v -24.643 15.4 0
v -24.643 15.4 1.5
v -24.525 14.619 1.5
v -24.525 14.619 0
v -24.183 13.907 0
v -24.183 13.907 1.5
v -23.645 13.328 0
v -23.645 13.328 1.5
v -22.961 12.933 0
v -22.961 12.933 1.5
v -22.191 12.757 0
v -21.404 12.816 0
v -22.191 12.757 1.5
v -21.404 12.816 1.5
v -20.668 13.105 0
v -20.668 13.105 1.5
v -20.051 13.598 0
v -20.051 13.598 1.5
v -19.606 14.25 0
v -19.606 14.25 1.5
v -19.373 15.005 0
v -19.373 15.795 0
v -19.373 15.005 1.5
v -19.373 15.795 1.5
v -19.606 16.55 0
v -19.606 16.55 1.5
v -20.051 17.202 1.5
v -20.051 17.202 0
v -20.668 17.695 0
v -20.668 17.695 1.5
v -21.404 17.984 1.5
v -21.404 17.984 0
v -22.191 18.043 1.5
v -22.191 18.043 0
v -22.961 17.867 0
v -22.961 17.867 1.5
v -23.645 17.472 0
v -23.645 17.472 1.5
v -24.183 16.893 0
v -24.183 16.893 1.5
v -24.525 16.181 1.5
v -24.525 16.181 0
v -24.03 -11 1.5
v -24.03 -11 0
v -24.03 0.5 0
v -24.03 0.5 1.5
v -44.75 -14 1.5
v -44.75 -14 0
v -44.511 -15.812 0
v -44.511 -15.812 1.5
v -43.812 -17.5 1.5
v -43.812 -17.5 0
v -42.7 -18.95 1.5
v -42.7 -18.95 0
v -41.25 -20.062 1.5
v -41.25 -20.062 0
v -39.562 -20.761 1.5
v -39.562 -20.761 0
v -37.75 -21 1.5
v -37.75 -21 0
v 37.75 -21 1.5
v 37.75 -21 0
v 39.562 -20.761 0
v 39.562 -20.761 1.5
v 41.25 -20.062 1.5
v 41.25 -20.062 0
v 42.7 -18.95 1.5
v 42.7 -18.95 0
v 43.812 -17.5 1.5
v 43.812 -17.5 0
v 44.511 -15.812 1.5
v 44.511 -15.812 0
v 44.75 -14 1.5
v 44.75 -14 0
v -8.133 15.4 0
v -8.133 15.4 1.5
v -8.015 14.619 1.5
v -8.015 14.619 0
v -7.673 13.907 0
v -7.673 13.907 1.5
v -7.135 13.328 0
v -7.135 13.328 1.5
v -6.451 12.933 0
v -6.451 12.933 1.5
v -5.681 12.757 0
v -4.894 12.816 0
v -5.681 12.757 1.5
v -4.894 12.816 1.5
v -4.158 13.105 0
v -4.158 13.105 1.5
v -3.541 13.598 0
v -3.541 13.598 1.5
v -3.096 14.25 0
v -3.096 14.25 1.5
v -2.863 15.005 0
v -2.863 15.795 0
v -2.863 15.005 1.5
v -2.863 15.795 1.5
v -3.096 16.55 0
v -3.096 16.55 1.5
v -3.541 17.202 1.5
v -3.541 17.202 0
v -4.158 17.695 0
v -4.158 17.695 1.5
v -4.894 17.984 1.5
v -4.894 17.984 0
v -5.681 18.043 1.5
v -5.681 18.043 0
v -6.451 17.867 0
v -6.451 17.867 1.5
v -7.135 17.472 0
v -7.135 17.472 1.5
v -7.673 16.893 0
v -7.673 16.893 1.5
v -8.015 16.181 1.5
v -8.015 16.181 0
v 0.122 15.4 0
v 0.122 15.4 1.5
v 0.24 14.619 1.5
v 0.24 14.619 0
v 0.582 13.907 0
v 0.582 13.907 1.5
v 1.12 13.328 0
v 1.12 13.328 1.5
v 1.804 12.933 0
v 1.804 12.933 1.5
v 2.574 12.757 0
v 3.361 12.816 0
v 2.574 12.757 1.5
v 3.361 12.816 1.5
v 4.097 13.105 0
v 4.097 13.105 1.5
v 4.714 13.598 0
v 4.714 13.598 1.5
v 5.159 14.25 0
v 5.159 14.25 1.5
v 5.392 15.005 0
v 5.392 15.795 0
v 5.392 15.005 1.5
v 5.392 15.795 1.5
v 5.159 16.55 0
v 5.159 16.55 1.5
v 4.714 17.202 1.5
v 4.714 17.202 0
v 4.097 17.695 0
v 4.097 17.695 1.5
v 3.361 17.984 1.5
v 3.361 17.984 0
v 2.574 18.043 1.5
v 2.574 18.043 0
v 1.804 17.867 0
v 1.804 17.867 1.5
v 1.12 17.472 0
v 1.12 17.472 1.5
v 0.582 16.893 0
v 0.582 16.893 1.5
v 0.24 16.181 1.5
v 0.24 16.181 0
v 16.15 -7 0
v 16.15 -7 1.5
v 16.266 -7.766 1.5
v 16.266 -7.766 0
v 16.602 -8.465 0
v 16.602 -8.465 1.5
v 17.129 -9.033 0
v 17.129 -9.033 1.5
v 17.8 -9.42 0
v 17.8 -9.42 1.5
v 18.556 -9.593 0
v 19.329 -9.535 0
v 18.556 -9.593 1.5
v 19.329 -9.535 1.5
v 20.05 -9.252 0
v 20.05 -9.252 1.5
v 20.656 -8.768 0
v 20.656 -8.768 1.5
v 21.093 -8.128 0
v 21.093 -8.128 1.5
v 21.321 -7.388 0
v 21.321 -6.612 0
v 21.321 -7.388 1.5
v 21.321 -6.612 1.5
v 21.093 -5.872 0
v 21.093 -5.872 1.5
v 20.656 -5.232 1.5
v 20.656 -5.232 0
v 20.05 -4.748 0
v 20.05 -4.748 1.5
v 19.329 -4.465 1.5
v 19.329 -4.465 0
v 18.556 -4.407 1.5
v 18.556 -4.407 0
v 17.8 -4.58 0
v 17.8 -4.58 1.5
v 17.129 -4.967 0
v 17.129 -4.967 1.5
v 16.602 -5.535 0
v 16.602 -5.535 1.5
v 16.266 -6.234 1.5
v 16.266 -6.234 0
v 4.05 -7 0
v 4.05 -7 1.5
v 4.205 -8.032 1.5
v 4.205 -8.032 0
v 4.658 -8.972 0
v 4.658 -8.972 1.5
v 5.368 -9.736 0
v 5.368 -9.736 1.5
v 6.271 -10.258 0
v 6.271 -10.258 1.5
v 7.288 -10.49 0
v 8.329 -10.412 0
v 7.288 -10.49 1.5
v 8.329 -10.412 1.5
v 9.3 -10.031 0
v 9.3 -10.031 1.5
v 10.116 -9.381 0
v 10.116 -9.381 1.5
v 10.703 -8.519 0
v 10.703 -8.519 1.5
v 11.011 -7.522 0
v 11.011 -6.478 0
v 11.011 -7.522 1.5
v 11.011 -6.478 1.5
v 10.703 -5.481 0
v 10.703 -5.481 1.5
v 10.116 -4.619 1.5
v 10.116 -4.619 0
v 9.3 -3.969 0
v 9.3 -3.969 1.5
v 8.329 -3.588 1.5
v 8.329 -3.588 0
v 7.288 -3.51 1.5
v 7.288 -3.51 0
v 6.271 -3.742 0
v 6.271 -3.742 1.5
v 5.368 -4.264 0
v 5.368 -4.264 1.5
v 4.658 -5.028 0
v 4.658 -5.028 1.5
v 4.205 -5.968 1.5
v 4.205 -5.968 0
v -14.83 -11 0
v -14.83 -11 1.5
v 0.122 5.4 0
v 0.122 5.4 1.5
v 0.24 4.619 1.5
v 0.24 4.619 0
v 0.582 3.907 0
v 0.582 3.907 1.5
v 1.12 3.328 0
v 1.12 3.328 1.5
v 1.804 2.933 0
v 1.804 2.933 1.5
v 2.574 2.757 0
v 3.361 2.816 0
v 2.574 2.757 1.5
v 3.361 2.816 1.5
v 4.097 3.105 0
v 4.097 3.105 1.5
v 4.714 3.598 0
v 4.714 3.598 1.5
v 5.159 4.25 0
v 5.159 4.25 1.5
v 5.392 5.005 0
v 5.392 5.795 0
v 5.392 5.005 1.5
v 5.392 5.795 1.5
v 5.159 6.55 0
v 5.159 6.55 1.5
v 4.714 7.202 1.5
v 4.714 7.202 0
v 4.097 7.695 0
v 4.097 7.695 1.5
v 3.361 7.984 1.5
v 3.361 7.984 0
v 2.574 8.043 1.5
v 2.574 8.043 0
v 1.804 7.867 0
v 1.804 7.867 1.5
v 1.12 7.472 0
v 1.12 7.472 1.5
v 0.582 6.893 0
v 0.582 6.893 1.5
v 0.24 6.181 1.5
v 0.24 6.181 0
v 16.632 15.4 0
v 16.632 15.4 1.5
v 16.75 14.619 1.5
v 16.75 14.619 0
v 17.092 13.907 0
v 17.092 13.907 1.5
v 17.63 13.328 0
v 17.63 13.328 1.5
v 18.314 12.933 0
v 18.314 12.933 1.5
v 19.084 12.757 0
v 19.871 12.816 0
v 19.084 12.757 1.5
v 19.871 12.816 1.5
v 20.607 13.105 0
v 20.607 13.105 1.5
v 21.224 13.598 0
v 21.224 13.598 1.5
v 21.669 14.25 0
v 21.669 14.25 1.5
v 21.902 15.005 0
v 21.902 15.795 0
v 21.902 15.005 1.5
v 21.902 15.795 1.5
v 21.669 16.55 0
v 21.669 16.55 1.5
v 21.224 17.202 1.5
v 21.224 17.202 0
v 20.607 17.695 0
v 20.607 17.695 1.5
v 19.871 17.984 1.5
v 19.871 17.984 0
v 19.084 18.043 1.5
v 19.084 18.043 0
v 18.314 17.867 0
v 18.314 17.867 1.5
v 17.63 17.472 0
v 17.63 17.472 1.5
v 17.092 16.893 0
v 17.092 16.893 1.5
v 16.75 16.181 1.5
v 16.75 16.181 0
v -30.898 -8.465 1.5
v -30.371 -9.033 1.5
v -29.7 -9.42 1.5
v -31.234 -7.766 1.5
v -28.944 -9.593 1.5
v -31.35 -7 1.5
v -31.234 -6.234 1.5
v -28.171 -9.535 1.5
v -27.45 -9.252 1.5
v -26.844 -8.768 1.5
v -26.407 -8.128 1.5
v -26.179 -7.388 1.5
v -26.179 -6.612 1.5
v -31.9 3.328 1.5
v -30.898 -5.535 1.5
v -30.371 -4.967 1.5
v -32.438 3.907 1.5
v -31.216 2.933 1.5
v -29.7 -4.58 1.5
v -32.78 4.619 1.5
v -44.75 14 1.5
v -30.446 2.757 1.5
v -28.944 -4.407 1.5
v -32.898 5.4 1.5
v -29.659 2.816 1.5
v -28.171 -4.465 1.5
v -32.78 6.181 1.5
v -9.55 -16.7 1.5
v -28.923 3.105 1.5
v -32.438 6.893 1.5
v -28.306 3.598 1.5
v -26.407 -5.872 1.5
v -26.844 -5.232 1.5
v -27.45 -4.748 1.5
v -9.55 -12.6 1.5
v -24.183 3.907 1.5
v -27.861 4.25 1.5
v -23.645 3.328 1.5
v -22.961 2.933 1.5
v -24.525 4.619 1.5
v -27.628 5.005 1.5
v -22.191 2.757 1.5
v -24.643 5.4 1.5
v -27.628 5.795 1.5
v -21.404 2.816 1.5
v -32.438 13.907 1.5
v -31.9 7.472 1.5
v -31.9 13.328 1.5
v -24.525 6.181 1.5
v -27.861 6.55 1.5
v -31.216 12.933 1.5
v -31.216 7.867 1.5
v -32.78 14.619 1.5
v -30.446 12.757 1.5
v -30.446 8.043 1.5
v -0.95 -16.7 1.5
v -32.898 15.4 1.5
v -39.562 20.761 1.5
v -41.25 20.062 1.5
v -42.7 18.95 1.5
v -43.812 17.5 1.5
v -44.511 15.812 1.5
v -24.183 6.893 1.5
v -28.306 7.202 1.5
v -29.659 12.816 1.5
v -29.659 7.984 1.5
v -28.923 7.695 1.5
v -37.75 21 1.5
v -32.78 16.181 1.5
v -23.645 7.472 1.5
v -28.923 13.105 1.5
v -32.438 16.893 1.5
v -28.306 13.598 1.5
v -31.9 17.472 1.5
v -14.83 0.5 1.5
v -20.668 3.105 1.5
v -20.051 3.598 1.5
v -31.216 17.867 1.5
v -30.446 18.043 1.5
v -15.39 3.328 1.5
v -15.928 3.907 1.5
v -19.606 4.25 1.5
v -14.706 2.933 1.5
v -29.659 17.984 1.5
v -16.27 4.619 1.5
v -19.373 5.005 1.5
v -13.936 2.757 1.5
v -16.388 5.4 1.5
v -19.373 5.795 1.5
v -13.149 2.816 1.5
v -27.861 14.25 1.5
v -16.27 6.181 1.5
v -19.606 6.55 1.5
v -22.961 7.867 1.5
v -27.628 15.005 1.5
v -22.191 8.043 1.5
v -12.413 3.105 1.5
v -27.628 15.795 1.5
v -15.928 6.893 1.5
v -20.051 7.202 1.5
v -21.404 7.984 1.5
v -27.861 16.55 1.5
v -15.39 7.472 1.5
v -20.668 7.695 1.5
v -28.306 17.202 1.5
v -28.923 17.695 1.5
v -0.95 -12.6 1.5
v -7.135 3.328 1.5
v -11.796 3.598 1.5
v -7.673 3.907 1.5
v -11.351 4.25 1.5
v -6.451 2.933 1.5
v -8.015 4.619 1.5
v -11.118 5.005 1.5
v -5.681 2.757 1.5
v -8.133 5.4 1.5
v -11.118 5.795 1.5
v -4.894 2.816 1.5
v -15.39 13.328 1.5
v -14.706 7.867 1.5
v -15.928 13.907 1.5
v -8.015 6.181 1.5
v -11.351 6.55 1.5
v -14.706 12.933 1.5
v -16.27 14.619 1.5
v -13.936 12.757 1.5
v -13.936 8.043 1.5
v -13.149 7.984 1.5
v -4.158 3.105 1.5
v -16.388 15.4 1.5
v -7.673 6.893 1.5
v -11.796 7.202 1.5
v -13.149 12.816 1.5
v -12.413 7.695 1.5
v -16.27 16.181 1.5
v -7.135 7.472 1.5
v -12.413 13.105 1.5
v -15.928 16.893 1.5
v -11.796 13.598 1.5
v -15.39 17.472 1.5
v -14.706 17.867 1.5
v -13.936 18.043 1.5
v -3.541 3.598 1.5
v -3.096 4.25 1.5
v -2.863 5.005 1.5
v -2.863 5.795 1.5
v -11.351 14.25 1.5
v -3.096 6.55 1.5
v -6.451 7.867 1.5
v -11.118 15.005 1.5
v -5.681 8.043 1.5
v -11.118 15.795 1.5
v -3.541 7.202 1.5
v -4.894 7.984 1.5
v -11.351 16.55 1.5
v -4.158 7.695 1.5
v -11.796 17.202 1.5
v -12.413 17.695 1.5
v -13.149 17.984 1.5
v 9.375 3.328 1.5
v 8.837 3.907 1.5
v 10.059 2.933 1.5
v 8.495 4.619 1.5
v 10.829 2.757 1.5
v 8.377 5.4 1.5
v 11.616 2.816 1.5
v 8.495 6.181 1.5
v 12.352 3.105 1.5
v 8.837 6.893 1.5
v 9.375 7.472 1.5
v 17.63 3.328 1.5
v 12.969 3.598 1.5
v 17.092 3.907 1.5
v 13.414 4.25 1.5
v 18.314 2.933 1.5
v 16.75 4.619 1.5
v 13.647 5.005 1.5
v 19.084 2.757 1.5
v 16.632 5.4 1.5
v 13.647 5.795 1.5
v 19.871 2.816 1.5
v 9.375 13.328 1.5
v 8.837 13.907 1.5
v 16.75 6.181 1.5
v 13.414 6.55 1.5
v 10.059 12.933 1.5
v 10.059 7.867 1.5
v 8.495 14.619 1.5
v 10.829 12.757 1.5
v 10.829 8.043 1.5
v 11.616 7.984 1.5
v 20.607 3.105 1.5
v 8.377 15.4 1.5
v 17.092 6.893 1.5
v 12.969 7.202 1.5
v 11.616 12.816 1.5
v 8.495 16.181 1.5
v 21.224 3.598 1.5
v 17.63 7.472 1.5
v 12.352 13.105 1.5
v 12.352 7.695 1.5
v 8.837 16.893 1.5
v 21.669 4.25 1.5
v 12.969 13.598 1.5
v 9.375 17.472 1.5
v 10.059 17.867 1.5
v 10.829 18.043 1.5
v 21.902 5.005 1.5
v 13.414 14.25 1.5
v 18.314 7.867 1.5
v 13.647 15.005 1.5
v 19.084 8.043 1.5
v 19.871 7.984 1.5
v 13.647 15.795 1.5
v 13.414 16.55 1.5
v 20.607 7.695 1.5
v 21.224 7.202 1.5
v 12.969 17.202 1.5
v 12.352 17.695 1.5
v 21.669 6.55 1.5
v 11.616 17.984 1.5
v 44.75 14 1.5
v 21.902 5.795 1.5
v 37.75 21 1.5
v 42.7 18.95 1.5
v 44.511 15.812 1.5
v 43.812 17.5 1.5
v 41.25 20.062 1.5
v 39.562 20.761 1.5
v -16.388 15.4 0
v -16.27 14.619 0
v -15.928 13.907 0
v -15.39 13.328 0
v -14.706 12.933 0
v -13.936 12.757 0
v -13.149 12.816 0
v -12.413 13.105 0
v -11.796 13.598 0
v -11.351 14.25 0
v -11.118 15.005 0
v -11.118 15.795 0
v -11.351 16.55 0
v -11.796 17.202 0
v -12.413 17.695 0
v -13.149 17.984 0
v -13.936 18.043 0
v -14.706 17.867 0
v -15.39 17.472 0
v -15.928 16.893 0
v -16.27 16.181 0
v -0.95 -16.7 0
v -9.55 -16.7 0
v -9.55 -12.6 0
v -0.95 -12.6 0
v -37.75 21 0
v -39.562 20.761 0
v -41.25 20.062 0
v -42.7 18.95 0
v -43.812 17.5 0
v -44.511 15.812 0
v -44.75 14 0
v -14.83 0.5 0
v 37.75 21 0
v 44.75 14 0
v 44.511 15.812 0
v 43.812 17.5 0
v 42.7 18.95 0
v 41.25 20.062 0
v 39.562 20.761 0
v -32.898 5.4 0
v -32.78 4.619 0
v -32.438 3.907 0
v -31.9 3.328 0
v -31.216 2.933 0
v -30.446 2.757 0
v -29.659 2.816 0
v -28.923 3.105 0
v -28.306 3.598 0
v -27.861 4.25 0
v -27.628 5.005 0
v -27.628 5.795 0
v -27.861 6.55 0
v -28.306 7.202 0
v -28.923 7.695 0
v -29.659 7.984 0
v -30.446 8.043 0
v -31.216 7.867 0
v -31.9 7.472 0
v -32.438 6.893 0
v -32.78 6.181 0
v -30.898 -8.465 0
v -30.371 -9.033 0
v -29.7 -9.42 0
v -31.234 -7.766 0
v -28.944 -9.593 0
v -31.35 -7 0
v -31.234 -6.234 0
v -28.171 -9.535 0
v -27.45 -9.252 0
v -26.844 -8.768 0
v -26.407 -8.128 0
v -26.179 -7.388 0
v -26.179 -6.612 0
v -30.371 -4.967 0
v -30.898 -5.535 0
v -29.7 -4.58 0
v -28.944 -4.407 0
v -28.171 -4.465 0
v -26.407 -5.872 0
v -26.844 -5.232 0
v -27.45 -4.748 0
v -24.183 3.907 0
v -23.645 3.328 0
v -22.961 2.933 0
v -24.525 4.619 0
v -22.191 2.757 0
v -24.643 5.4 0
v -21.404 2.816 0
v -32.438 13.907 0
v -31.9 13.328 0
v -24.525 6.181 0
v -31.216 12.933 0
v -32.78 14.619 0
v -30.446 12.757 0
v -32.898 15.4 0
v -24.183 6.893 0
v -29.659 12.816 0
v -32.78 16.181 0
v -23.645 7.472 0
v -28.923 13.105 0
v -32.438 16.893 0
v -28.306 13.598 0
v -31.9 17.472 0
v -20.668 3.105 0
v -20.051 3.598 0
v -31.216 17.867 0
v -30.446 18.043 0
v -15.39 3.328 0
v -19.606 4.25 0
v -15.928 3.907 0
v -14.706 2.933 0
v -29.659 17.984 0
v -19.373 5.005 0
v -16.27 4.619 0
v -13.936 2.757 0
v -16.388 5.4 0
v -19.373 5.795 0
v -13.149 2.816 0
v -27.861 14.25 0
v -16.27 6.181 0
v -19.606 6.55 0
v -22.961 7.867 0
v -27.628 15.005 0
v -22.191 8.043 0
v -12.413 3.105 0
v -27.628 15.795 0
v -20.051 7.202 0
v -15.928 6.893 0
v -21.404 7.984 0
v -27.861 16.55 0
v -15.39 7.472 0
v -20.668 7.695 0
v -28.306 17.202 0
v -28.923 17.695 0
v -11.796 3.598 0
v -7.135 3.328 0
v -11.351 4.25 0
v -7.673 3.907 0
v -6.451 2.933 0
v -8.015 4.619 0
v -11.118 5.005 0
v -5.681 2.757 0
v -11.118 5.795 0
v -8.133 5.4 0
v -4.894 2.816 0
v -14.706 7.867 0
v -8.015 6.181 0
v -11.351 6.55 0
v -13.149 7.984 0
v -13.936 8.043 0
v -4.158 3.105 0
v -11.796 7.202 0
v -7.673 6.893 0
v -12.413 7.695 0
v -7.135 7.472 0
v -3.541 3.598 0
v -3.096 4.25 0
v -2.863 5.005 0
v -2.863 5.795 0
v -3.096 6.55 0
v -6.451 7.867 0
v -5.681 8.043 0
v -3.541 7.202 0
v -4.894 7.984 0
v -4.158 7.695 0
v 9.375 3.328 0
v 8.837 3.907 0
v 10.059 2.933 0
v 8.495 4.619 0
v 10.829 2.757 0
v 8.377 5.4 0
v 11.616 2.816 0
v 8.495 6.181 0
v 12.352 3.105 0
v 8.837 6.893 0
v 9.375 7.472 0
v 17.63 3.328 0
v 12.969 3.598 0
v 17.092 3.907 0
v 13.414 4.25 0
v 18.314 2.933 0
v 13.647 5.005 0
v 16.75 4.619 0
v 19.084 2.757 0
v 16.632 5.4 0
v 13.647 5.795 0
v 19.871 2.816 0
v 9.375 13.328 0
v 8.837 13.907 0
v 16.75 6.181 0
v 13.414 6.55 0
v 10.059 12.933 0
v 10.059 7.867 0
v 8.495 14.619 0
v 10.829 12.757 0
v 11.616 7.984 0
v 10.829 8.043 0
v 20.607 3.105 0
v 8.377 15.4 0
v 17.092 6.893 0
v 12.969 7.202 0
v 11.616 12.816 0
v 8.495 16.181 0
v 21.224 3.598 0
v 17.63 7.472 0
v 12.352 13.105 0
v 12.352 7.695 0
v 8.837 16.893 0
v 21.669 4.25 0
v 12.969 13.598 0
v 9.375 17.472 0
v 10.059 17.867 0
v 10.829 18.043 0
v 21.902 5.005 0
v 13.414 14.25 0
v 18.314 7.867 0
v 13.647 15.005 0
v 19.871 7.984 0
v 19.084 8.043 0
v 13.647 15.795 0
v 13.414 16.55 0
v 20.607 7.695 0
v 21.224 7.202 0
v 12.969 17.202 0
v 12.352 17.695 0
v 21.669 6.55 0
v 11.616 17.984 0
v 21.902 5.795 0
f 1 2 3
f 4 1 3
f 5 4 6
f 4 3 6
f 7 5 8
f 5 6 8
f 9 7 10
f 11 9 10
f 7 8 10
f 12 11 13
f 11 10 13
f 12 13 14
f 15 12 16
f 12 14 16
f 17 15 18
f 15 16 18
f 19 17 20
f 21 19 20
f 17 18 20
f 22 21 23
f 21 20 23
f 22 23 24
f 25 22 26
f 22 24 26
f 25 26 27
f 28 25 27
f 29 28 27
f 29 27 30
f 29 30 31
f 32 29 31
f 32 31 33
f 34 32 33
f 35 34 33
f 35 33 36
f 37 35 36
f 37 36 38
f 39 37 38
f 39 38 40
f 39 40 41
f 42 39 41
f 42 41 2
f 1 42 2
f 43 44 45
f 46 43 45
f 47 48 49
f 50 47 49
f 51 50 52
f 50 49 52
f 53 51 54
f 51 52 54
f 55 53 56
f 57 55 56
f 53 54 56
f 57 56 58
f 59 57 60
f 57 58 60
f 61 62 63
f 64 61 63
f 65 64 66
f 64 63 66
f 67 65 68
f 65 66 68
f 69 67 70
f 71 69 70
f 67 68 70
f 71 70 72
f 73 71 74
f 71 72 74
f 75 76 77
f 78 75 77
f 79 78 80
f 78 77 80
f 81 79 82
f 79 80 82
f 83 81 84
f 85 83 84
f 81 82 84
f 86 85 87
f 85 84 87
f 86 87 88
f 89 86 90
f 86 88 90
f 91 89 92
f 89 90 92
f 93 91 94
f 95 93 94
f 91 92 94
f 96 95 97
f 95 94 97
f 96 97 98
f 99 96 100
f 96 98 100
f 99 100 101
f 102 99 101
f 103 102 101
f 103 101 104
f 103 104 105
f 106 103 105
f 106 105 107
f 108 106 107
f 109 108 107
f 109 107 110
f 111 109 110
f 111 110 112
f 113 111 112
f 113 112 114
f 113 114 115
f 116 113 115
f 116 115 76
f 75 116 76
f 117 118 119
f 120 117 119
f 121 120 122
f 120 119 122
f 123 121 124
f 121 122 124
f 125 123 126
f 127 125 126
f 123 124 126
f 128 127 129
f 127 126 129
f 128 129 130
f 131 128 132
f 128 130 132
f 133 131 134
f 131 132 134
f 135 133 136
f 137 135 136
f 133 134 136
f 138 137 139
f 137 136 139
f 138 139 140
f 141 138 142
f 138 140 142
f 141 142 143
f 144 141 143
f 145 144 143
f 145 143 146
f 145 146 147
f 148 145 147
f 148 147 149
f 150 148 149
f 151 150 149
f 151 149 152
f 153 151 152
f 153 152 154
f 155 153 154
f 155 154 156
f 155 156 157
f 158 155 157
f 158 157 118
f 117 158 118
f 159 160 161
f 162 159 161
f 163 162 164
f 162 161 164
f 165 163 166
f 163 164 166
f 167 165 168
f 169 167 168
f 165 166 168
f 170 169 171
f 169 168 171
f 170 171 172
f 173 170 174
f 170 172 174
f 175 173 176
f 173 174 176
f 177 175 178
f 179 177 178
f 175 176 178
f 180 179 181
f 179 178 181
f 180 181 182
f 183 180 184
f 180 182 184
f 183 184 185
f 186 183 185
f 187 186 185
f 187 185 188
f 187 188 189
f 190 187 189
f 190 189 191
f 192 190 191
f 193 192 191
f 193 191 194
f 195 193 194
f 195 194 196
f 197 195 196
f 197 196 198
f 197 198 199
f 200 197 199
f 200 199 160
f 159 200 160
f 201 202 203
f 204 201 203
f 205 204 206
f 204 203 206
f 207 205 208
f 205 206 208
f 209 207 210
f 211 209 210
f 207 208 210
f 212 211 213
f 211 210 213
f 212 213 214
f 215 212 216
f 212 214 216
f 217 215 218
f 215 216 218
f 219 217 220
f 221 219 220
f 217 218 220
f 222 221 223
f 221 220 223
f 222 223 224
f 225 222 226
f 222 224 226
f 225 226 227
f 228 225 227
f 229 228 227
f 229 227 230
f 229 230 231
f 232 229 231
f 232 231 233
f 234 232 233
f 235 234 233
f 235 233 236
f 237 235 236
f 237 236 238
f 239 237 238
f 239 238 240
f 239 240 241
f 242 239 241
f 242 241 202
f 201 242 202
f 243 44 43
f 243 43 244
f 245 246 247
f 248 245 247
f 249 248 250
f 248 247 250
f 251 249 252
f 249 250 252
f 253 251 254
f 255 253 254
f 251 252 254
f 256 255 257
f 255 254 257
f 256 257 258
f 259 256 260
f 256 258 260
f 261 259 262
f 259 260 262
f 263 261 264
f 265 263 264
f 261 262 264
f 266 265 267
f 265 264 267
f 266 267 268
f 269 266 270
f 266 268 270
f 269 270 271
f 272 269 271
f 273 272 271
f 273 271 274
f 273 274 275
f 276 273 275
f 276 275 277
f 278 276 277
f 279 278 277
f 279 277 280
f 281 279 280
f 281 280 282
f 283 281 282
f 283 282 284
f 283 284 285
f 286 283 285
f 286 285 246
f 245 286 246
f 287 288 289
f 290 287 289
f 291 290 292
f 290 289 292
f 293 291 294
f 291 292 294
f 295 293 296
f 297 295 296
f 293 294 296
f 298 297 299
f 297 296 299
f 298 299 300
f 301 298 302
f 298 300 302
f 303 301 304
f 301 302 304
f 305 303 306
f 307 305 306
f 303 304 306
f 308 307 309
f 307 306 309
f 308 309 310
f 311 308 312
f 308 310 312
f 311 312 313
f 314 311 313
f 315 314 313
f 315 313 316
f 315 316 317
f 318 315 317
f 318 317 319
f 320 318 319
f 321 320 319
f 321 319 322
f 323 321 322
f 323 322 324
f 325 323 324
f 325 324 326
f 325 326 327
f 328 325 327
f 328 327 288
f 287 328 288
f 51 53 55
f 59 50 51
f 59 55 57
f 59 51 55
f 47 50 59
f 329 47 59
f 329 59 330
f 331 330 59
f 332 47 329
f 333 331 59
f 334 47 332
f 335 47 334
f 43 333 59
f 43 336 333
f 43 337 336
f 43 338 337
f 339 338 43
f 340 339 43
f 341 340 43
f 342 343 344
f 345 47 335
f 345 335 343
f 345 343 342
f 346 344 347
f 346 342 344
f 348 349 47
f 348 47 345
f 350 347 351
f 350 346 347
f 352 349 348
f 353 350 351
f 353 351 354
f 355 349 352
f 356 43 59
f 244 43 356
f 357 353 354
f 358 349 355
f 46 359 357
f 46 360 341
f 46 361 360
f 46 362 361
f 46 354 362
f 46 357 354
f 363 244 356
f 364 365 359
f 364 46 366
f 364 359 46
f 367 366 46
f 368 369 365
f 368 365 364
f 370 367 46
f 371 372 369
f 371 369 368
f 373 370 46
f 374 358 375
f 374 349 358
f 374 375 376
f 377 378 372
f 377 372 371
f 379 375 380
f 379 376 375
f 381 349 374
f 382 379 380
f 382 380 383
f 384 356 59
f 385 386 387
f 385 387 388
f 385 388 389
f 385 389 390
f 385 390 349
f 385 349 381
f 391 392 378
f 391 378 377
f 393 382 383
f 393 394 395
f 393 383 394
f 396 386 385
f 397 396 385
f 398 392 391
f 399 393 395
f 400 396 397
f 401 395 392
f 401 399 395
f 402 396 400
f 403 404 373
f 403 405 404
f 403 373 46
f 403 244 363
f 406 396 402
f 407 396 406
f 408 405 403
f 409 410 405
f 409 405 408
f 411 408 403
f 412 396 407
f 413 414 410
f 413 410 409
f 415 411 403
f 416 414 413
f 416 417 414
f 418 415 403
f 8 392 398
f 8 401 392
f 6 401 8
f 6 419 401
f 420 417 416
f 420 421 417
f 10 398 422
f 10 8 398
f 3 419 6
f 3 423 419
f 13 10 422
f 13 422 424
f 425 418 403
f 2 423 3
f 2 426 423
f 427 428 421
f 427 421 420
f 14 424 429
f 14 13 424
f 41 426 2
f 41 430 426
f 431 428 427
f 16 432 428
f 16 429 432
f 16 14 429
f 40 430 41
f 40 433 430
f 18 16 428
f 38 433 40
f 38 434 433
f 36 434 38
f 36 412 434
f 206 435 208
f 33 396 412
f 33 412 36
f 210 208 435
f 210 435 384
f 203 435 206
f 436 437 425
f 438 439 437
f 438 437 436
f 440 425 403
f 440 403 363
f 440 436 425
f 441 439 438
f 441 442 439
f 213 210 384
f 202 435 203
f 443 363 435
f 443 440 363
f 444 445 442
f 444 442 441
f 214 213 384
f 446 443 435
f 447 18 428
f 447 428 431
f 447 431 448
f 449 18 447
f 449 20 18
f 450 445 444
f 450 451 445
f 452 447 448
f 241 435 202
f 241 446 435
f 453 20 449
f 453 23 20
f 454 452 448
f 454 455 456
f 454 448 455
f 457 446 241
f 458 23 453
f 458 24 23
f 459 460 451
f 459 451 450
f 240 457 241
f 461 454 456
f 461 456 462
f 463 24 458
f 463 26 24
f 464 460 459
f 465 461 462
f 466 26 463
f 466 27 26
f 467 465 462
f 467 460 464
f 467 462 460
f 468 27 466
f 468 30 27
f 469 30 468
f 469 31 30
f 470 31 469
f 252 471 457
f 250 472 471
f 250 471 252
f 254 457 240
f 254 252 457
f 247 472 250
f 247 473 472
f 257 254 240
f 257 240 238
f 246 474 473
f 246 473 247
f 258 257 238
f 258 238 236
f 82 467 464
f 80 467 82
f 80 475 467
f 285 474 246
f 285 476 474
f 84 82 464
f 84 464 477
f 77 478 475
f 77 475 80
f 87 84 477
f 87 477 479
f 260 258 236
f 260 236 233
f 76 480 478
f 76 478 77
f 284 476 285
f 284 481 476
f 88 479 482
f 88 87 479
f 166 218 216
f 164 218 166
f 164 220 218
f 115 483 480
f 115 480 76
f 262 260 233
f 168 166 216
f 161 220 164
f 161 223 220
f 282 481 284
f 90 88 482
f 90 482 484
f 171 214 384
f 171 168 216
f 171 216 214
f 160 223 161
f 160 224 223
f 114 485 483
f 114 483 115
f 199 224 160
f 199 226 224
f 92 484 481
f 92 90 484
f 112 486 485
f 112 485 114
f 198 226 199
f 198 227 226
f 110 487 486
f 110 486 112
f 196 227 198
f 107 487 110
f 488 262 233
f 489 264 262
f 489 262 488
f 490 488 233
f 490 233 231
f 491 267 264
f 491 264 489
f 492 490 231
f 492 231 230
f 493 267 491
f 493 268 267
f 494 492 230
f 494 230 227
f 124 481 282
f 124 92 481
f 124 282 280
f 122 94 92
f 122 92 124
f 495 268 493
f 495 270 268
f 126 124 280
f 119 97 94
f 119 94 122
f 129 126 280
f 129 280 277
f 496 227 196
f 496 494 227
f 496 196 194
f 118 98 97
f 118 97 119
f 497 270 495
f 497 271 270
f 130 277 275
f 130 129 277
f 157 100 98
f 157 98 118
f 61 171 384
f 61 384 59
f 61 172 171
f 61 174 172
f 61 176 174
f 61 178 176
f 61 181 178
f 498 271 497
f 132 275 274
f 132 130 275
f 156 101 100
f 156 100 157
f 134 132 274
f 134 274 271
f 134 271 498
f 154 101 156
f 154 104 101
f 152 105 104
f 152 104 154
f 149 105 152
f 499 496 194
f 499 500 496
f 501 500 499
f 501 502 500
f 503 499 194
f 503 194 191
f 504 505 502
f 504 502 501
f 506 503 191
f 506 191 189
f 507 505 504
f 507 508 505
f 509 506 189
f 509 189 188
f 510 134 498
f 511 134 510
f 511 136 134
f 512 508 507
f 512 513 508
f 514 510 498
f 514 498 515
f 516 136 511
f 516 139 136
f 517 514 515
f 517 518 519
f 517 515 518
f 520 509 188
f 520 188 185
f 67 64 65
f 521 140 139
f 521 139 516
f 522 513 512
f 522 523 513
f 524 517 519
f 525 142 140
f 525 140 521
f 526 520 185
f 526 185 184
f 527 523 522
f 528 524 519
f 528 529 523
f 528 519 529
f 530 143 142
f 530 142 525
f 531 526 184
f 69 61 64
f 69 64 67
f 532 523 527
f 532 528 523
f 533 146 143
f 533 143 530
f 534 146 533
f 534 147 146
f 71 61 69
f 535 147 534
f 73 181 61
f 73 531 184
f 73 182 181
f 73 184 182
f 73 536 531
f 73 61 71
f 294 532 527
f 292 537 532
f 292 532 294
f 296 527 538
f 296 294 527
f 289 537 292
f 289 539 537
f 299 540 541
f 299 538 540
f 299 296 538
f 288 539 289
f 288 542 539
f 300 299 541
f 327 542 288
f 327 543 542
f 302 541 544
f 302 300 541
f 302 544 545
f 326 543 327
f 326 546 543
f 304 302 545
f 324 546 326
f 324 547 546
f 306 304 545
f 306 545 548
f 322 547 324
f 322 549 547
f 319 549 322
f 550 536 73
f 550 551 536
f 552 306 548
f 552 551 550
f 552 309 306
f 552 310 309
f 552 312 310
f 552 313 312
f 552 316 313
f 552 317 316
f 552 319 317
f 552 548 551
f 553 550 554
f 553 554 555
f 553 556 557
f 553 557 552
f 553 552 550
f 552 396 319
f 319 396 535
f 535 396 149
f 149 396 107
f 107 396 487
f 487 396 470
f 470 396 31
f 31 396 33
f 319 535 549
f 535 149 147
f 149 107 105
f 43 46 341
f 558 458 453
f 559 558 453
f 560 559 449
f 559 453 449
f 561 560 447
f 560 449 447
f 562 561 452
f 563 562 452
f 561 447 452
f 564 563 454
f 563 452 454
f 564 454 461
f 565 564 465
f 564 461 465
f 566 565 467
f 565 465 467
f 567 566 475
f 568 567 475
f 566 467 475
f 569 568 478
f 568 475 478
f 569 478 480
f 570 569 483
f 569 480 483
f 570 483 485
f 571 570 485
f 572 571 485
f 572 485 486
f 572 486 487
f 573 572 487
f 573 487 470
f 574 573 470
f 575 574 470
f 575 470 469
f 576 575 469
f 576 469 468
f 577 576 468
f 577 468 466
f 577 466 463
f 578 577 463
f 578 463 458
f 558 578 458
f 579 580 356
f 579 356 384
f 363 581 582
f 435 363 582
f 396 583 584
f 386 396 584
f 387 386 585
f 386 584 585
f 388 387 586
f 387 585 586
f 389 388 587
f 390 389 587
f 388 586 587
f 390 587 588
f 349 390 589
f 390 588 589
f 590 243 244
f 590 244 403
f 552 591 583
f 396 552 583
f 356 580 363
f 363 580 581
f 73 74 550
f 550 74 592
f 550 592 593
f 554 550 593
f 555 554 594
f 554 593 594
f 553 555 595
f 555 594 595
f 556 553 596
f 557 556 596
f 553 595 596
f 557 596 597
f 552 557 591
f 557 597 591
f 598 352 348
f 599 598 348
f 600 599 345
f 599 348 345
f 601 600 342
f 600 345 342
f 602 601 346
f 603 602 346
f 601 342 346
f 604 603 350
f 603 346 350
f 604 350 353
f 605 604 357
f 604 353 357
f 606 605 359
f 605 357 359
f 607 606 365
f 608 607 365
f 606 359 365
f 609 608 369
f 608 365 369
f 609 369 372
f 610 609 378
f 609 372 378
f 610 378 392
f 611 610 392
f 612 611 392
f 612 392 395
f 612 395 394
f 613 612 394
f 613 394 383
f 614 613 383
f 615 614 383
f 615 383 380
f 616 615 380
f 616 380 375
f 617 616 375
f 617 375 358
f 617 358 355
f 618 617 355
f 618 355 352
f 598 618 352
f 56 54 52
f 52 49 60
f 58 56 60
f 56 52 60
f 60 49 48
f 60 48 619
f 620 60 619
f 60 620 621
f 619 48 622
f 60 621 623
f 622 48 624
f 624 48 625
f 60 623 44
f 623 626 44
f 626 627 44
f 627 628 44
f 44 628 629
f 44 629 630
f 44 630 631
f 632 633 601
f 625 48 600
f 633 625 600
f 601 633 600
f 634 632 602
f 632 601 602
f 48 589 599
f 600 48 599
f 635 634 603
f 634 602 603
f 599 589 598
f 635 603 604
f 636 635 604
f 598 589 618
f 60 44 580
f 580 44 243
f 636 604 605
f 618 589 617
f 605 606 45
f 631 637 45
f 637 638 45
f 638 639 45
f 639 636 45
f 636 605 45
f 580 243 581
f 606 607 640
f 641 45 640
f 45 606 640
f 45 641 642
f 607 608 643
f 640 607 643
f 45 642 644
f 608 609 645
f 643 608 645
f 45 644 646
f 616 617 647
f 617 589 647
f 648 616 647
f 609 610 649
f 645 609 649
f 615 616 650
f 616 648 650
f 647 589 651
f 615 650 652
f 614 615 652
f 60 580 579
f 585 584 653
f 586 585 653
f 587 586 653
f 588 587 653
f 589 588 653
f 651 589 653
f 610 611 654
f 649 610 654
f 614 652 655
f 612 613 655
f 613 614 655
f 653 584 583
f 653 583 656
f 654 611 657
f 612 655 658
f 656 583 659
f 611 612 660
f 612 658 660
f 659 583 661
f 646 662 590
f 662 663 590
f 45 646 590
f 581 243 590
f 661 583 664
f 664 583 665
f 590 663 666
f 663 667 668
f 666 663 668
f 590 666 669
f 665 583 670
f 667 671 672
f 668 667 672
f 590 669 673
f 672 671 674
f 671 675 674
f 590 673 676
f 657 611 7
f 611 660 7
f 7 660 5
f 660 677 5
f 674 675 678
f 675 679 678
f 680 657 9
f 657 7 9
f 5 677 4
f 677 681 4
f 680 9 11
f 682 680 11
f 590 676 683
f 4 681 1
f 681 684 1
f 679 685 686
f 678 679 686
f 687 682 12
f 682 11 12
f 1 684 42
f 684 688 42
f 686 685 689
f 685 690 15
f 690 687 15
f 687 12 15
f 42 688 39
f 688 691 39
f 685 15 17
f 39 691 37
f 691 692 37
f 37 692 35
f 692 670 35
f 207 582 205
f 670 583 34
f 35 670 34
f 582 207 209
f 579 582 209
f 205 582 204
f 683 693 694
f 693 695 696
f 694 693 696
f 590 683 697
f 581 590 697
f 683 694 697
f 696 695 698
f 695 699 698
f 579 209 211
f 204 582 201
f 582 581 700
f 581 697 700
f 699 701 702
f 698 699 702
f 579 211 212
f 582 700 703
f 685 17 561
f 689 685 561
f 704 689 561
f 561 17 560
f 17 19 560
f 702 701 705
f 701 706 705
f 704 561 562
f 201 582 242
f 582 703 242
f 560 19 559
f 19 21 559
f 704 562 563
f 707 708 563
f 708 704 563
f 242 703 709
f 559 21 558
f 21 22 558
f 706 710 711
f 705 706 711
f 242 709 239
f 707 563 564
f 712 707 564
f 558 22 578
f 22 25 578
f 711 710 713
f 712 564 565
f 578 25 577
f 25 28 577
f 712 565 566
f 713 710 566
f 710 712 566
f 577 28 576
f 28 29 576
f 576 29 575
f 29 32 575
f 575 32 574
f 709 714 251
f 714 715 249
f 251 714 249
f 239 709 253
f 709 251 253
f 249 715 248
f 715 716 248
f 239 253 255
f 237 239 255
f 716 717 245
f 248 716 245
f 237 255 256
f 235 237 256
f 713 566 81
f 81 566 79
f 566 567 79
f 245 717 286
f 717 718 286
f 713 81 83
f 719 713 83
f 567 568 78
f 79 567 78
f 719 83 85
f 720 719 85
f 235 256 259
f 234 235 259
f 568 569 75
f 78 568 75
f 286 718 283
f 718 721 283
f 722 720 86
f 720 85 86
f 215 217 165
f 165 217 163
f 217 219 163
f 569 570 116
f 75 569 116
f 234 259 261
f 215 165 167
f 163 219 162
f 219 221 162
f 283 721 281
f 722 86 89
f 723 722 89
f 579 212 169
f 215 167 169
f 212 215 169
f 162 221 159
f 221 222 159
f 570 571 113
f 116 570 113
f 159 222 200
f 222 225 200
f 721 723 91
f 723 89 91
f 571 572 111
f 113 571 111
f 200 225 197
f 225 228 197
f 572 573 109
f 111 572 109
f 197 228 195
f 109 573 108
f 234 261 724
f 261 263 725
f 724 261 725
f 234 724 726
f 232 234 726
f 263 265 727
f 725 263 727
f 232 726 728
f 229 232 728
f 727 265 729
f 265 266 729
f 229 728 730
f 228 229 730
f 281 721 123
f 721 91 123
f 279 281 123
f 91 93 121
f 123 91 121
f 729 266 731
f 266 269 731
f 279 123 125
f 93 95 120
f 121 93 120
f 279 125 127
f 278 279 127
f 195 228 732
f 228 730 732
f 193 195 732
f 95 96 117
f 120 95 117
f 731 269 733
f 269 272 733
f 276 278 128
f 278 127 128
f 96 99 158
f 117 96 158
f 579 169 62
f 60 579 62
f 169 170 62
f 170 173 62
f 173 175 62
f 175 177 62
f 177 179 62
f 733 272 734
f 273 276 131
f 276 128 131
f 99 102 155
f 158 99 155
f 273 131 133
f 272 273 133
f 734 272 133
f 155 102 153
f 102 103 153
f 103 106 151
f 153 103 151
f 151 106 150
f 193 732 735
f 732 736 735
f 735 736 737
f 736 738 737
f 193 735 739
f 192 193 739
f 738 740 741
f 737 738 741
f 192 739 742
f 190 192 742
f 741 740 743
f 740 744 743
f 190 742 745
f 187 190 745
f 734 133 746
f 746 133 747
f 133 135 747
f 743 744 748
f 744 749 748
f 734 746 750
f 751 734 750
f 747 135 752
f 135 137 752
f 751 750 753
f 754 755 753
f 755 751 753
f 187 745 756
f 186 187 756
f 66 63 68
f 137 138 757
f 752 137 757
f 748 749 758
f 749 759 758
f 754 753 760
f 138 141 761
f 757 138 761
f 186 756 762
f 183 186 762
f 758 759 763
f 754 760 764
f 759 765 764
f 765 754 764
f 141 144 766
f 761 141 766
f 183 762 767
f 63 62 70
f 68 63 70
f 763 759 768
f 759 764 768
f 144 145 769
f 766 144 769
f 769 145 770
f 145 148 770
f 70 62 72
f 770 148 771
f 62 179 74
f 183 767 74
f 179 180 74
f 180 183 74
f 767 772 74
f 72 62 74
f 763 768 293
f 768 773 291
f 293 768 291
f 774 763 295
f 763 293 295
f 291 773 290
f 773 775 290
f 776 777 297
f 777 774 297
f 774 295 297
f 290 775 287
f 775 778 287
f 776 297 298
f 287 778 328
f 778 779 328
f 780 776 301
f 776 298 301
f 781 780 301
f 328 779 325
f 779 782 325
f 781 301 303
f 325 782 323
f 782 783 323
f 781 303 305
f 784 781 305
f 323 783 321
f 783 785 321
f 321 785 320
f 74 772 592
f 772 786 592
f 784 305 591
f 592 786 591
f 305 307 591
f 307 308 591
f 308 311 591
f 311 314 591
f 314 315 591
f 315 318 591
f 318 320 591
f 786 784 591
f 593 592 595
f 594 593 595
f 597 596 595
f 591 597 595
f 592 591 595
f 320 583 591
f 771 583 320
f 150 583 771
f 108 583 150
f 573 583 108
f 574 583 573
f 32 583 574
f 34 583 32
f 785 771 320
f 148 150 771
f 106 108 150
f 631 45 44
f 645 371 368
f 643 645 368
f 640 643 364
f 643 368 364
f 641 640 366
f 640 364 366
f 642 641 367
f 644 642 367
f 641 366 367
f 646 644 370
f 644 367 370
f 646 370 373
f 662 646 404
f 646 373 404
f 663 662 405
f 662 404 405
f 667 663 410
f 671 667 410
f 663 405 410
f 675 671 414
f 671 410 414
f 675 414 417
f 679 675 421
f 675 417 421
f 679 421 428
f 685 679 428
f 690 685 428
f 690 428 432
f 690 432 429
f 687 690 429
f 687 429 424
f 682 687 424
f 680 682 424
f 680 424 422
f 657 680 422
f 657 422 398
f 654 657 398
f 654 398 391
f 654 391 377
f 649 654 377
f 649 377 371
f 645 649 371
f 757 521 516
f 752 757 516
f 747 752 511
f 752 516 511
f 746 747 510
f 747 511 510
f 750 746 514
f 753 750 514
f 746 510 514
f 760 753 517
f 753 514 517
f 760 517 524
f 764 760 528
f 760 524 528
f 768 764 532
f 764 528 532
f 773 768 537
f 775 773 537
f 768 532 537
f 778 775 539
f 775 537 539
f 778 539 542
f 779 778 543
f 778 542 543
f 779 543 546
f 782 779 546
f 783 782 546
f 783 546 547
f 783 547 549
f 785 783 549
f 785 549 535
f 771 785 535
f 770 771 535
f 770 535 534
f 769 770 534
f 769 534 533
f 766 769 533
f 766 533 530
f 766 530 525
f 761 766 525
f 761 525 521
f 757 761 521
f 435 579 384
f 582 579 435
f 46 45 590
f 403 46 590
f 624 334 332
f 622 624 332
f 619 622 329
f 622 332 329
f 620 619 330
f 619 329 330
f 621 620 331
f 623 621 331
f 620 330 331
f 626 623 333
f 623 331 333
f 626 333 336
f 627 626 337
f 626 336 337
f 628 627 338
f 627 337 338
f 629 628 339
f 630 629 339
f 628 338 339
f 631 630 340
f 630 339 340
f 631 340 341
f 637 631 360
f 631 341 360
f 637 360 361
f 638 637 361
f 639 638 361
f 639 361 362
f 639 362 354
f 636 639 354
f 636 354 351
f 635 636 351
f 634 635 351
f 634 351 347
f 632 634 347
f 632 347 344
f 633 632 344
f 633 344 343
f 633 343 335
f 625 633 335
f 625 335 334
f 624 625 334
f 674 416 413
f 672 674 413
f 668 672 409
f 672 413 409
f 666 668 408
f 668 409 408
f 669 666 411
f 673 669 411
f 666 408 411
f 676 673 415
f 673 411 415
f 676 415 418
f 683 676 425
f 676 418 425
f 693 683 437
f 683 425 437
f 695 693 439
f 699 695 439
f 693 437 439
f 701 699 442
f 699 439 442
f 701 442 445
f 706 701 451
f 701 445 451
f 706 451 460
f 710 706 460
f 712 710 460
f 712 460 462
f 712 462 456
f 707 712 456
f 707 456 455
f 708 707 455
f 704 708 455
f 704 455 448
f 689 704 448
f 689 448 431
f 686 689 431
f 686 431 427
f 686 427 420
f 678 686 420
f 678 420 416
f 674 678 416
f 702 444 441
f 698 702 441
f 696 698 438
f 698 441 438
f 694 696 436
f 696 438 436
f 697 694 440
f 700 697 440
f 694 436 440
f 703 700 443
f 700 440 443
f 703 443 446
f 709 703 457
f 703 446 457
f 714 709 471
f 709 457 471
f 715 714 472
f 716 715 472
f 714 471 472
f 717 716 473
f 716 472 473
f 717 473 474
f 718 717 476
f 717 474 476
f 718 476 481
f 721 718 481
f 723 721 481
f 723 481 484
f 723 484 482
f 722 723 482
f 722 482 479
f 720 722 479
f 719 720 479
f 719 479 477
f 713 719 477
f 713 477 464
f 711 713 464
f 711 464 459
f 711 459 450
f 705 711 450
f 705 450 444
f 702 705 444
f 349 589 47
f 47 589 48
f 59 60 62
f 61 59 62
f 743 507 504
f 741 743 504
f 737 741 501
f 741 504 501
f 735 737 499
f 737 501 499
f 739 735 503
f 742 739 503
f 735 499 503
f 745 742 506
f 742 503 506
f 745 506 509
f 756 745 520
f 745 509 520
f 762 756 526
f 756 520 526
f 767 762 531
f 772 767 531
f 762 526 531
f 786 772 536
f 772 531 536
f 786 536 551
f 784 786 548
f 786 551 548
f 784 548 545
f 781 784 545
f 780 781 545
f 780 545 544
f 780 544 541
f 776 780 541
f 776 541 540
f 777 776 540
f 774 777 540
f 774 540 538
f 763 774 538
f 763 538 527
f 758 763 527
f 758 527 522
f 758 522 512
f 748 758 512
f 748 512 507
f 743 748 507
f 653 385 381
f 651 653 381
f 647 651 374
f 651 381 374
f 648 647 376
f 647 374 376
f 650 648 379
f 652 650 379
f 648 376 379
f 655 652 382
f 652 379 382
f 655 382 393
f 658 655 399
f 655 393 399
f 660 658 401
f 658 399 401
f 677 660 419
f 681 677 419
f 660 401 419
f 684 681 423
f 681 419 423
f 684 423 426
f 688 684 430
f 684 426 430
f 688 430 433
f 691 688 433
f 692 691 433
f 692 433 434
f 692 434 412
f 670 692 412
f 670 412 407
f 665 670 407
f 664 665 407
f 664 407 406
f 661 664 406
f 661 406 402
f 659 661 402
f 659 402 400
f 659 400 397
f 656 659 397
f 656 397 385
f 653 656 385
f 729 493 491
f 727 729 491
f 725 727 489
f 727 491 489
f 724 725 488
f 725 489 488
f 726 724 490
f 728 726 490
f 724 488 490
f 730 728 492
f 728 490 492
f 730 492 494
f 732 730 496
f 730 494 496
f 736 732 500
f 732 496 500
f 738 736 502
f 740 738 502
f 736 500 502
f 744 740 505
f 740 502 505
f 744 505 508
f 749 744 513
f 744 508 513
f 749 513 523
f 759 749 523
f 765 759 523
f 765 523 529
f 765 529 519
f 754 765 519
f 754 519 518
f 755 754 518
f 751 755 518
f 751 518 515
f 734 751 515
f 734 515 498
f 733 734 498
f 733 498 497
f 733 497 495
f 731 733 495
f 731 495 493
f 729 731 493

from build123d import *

# Parameters (mm, degrees)
F0_W     = 8.6
F0_H     = 4.1
F0_W_2   = 9.2
F0_H_2   = 11.5
F1_DEPTH = 1.5
F2_D     = 5.2
F2_DEPTH = 2
F2_TIP   = 1.5622376095
F3_D     = 7
F3_DEPTH = 2
F3_TIP   = 2.1030121666
F4_D     = 5.3
F4_DEPTH = 2
F4_TIP   = 1.5922806404


with BuildPart() as f1:
    # F0 (on Top) → F1 (new body)
    with BuildSketch(Plane.XY):
        with BuildLine():
            Line((-37.75, -21), (37.75, -21))
            ThreePointArc((37.75, -21), (42.6997474683, -18.9497474683), (44.75, -14))
            Line((44.75, -14), (44.75, 14))
            ThreePointArc((44.75, 14), (42.6997474683, 18.9497474683), (37.75, 21))
            Line((37.75, 21), (-37.75, 21))
            ThreePointArc((-37.75, 21), (-42.6997474683, 18.9497474683), (-44.75, 14))
            Line((-44.75, 14), (-44.75, -14))
            ThreePointArc((-44.75, -14), (-42.6997474683, -18.9497474683), (-37.75, -21))
        make_face()
        with Locations((-5.25, -14.65)):
            Rectangle(F0_W, F0_H, mode=Mode.SUBTRACT)
        with Locations((-19.43, -5.25)):
            Rectangle(F0_W_2, F0_H_2, mode=Mode.SUBTRACT)
    extrude(amount=F1_DEPTH)

    # F2
    with Locations(Plane(origin=(0, 0, 0), x_dir=(1, 0, 0), z_dir=(0, 0, -1))):
        with Locations((18.75, 7), (-28.75, 7)):
            Hole(F2_D / 2, depth=F2_DEPTH)
            with Locations((0, 0, -(F2_DEPTH + F2_TIP / 2))):  # 118° drill point
                Cone(0, F2_D / 2, F2_TIP, mode=Mode.SUBTRACT)

    # F3
    with Locations(Plane(origin=(0, 0, 0), x_dir=(1, 0, 0), z_dir=(0, 0, -1))):
        with Locations((7.55, 7)):
            Hole(F3_D / 2, depth=F3_DEPTH)
            with Locations((0, 0, -(F3_DEPTH + F3_TIP / 2))):  # 118° drill point
                Cone(0, F3_D / 2, F3_TIP, mode=Mode.SUBTRACT)

    # F4
    with Locations(Plane(origin=(0, 0, 0), x_dir=(1, 0, 0), z_dir=(0, 0, -1))):
        with Locations((-30.2482247353, -5.4), (-30.2482247353, -15.4), (-21.9932247353, -15.4), (-21.9932247353, -5.4), (-13.7382247353, -15.4), (-13.7382247353, -5.4), (-5.4832247353, -15.4), (-5.4832247353, -5.4), (2.7717752647, -15.4), (2.7717752647, -5.4), (11.0267752647, -15.4), (11.0267752647, -5.4), (19.2817752647, -15.4), (19.2817752647, -5.4)):
            Hole(F4_D / 2, depth=F4_DEPTH)
            with Locations((0, 0, -(F4_DEPTH + F4_TIP / 2))):  # 118° drill point
                Cone(0, F4_D / 2, F4_TIP, mode=Mode.SUBTRACT)


solid = f1.part
